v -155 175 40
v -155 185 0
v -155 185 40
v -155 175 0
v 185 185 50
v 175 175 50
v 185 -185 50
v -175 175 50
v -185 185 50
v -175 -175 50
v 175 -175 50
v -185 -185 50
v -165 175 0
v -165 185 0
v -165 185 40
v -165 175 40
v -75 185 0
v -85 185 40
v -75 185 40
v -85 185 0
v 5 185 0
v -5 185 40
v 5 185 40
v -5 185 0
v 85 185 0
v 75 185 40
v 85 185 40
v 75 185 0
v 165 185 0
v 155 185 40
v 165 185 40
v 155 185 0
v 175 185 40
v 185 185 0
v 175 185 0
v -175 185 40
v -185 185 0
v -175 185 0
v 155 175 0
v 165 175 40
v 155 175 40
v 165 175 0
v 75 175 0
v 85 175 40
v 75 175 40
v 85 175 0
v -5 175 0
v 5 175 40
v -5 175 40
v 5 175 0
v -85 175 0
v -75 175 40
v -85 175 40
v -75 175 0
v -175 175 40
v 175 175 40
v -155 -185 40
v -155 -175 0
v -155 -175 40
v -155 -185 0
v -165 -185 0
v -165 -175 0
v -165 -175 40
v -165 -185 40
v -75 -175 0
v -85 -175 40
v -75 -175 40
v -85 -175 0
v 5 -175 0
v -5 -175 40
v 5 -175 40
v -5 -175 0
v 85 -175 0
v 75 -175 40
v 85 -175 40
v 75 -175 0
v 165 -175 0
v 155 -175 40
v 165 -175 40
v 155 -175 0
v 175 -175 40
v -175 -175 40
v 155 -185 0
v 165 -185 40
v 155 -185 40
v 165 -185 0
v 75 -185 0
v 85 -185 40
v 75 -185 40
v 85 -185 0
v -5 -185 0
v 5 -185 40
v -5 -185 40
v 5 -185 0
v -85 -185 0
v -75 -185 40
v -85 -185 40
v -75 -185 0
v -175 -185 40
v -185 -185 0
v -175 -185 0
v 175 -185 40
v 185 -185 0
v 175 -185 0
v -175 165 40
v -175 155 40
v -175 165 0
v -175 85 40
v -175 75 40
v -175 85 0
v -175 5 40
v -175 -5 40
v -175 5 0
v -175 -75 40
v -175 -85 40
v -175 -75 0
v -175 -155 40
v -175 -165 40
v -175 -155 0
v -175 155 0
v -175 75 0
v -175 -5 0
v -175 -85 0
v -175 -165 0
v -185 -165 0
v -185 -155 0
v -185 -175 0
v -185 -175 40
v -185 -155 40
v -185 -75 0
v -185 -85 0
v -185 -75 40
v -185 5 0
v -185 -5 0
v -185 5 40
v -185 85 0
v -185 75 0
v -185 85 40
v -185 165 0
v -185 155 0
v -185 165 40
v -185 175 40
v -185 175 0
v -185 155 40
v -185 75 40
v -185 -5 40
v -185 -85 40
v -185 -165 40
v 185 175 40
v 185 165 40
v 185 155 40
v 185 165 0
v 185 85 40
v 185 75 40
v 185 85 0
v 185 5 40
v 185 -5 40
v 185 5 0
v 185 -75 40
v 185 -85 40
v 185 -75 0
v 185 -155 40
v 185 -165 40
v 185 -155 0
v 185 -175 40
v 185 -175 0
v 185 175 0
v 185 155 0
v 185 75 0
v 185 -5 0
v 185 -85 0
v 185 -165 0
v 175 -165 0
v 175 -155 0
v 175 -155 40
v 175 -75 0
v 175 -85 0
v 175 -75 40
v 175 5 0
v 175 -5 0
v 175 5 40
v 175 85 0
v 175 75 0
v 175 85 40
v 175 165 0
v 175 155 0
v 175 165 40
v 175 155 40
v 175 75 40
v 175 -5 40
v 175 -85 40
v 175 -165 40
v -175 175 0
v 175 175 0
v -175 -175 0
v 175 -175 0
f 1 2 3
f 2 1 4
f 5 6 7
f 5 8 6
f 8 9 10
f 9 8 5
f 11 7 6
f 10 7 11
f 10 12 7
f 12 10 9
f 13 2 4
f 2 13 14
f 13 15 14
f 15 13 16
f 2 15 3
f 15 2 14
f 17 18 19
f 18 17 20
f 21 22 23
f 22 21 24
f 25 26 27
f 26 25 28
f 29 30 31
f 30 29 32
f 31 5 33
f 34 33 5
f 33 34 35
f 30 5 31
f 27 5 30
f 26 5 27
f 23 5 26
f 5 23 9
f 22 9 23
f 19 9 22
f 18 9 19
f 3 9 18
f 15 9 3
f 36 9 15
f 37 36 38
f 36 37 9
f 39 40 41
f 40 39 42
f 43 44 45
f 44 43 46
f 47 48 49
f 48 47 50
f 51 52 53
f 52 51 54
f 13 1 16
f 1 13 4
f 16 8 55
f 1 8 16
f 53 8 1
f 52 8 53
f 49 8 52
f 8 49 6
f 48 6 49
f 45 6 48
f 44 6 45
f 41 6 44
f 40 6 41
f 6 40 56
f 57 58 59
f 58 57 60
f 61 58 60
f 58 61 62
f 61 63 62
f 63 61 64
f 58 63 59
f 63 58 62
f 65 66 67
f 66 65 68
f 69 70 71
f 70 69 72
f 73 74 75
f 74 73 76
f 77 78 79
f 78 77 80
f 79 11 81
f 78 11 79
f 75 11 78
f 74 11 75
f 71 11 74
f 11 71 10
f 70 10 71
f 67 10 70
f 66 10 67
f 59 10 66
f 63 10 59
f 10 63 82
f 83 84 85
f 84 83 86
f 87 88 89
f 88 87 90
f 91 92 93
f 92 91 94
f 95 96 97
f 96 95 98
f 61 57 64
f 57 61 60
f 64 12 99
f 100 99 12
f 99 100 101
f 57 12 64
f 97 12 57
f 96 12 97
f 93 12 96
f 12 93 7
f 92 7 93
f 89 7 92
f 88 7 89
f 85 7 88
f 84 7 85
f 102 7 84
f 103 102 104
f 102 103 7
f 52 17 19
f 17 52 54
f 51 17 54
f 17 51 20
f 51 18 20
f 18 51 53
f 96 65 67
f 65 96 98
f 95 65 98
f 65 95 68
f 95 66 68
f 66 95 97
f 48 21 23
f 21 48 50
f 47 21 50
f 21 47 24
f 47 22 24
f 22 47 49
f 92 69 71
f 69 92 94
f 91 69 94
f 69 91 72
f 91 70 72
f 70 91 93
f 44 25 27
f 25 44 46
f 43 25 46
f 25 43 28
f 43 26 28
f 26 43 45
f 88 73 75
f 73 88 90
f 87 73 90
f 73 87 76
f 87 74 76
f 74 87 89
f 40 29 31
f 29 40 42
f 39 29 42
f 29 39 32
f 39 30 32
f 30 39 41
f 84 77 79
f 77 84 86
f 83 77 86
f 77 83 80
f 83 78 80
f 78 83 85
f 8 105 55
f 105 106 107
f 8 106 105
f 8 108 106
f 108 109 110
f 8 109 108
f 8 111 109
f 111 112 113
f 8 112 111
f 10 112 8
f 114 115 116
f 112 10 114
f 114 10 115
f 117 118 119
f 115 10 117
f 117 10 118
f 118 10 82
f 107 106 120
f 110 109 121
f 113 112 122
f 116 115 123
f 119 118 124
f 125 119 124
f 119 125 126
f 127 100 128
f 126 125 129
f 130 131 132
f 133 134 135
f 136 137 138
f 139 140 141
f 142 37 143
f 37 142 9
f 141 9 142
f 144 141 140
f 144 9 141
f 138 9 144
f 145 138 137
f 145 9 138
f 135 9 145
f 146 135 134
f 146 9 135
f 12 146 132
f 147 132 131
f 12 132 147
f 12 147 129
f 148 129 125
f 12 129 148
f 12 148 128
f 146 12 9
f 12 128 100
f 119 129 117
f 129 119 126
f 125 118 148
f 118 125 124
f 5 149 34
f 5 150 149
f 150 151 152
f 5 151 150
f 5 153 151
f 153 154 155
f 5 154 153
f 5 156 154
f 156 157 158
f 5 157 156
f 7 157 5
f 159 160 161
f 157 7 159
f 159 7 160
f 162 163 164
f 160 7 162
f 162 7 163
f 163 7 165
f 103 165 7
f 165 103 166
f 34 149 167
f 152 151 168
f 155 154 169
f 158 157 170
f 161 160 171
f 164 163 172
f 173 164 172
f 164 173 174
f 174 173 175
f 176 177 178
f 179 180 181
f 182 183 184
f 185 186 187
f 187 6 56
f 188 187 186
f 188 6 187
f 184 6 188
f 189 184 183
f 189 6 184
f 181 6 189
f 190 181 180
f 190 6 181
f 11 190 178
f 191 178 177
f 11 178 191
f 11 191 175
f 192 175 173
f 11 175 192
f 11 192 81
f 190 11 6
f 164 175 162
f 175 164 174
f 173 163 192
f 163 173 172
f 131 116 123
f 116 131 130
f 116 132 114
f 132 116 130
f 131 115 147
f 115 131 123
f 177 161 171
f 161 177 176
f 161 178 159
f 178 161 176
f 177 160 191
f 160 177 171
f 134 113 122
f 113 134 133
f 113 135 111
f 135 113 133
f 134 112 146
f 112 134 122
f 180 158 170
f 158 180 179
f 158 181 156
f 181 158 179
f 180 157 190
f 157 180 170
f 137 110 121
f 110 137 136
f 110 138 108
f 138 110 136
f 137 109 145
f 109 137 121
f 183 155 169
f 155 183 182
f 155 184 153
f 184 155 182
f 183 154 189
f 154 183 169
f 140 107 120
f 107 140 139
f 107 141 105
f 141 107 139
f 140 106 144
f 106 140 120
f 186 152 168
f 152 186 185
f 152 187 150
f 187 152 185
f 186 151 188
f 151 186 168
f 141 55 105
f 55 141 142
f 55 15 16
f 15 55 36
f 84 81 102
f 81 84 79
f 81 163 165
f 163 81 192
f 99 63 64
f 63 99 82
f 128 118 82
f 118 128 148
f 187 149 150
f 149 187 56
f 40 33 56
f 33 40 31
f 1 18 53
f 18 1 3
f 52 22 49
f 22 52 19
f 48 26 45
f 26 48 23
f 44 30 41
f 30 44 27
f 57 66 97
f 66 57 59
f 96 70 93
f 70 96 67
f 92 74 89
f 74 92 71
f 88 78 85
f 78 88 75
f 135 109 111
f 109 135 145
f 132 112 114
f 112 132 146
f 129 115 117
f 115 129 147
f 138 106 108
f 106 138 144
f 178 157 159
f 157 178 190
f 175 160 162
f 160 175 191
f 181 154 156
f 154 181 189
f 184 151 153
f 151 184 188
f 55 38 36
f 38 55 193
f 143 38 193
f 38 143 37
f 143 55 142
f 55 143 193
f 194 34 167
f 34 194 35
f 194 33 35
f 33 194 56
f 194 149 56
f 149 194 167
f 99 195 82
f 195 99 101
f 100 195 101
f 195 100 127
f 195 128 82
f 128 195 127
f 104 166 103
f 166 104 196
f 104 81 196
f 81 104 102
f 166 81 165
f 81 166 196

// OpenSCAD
// Cage slice 12
// Internal cavity: 350 x 350 x 700 mm
// Bar thickness: 10 mm (square)
// Gap between bars: 70 mm (uniform)
// Slice index: 12, slice Z range: [600, 650] (local coordinates 0..50)
// This file places the slice with its bottom on Z=0; when assembling, translate in Z by 600 mm.
// Export to STL with OpenSCAD: Render -> Export as STL.

bar = 10;
gap = 70;
s = bar + gap;
$fn = 64;  // cylinder resolution

x_centers = [-160, -80, 0, 80, 160];
y_centers = [-160, -80, 0, 80, 160];
z_centers = [5, 85, 165, 245, 325, 405, 485, 565, 645];

slice_index = 12;
slice_h = 50;

front_y = 180;
back_y = -180;
left_x = -180;
right_x = 180;
panel_length = 370;

hole_diam = 6.6;

module slice() {
    union() {
        // vertical bars on front and back (along Z)
        for (x = x_centers) {
            translate([x, front_y, slice_h/2]) cube([bar, bar, slice_h], center=true);
            translate([x, back_y, slice_h/2])  cube([bar, bar, slice_h], center=true);
        }
        // vertical bars on left and right (along Z)
        for (y = y_centers) {
            translate([left_x, y, slice_h/2])  cube([bar, bar, slice_h], center=true);
            translate([right_x, y, slice_h/2]) cube([bar, bar, slice_h], center=true);
        }
        // explicit corner vertical bars (ensure 4 corners for M6 rods)
        translate([-180, 180, slice_h/2]) cube([bar, bar, slice_h], center=true);
        translate([180, 180, slice_h/2]) cube([bar, bar, slice_h], center=true);
        translate([-180, -180, slice_h/2]) cube([bar, bar, slice_h], center=true);
        translate([180, -180, slice_h/2]) cube([bar, bar, slice_h], center=true);

        // horizontal bars (10 mm thick in Z) that lie inside this slice
        for (zc = z_centers) {
            z_local = zc - slice_index*slice_h;
            // include this horizontal bar if its center lies within this slice and it fits entirely here
            if (z_local >= bar/2 && z_local <= slice_h - bar/2) {
                // front and back horizontal bars (run along X)
                translate([0, front_y, z_local]) cube([panel_length, bar, bar], center=true);
                translate([0, back_y,  z_local]) cube([panel_length, bar, bar], center=true);
                // left and right horizontal bars (run along Y)
                translate([left_x, 0, z_local]) cube([bar, panel_length, bar], center=true);
                translate([right_x,0, z_local]) cube([bar, panel_length, bar], center=true);
            }
        }
    }
}

difference() {
    slice();
    // four vertical holes for M6 rods through corner bars (slightly longer than slice to ensure clean subtraction)
    translate([-180, 180, slice_h/2]) rotate([0,0,0]) cylinder(h = slice_h*4, r = hole_diam/2, center=true);
    translate([180, 180, slice_h/2]) rotate([0,0,0]) cylinder(h = slice_h*4, r = hole_diam/2, center=true);
    translate([-180, -180, slice_h/2]) rotate([0,0,0]) cylinder(h = slice_h*4, r = hole_diam/2, center=true);
    translate([180, -180, slice_h/2]) rotate([0,0,0]) cylinder(h = slice_h*4, r = hole_diam/2, center=true);
}

slice();
